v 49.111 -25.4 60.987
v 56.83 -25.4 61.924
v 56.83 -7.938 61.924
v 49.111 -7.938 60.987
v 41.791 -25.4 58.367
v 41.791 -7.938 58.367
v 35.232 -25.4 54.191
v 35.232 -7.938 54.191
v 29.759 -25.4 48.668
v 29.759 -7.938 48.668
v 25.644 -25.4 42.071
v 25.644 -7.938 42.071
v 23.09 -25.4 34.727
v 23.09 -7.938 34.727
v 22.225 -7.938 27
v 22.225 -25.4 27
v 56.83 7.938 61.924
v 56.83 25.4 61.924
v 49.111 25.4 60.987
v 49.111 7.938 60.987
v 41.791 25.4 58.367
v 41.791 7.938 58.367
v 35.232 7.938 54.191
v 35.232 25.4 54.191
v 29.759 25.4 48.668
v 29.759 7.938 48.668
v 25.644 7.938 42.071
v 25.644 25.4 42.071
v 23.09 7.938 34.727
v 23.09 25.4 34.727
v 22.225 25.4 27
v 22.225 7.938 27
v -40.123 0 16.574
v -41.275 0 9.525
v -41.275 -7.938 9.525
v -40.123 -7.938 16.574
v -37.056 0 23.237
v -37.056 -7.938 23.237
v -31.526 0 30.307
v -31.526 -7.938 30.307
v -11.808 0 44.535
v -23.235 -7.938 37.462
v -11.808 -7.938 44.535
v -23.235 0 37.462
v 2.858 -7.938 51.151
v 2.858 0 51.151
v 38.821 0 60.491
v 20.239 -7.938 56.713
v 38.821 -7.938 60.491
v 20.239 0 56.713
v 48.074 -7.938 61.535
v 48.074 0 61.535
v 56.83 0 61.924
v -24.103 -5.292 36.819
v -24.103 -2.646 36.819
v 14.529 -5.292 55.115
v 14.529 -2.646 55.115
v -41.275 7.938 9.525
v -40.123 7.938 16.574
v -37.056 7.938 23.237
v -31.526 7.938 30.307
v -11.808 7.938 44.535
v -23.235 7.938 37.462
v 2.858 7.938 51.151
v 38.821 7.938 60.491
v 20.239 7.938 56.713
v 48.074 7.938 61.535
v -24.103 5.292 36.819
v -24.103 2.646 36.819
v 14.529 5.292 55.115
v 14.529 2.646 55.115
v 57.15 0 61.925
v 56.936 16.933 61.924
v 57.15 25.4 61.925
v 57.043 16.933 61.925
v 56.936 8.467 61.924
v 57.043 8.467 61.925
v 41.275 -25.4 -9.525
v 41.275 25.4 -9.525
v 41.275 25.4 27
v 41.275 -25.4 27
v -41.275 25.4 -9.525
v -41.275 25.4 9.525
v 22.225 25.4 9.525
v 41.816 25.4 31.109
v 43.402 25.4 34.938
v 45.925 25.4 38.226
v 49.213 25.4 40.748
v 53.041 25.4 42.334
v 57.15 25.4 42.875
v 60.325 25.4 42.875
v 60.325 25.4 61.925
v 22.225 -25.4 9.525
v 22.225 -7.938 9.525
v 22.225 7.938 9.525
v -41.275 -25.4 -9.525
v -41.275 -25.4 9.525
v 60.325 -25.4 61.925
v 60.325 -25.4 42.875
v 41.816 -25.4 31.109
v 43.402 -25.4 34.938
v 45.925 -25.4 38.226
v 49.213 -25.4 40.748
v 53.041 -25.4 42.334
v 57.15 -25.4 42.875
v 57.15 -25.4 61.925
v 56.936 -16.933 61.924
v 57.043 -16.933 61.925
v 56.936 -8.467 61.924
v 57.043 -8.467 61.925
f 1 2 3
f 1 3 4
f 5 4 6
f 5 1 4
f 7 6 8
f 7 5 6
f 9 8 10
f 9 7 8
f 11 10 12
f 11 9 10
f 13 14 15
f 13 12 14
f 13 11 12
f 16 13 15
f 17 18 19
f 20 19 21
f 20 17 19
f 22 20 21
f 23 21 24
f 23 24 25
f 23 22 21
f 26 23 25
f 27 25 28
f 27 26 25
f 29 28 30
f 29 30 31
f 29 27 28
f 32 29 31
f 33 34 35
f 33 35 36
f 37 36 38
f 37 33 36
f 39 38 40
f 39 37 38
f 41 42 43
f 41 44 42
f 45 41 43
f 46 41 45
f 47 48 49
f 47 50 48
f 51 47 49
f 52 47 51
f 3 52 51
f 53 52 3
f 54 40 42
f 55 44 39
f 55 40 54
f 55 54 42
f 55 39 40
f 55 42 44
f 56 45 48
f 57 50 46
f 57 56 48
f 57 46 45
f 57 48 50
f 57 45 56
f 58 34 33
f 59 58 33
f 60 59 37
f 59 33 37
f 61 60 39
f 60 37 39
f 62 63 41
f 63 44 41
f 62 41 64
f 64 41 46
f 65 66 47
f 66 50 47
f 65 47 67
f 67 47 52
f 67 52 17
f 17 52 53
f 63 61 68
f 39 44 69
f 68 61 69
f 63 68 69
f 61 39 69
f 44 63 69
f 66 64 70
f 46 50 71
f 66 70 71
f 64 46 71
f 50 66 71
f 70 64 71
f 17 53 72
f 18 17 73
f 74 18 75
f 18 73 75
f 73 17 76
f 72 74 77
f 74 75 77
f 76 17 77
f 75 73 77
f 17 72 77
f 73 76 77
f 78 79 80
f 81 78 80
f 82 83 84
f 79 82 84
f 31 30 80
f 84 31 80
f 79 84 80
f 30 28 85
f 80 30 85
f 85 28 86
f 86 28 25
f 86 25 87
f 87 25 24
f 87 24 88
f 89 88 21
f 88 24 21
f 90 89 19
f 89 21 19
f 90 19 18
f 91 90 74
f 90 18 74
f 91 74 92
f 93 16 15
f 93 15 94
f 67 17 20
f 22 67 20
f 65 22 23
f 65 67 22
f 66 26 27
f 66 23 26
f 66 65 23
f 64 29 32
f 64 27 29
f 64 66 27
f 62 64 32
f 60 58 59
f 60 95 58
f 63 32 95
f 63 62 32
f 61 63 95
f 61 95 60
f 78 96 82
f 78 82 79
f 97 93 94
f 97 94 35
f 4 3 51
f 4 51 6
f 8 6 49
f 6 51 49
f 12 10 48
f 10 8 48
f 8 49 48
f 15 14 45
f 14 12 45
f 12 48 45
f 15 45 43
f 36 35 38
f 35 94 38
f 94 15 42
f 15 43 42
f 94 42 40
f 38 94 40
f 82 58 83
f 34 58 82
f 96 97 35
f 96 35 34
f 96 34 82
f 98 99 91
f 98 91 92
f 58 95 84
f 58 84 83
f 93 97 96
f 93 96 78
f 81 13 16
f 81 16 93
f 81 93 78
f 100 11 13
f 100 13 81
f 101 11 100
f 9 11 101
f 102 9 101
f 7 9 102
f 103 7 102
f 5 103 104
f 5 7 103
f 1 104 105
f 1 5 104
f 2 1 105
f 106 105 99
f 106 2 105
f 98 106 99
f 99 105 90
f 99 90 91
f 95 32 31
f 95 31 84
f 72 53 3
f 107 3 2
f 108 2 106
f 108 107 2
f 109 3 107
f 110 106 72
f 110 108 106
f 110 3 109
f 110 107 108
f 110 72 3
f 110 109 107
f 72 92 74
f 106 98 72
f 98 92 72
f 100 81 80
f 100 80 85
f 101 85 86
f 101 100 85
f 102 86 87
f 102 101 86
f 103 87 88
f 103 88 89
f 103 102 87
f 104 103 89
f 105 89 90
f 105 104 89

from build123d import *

# Parameters (mm, degrees)
F1_DEPTH = 25.4
F2_DEPTH = 7.9375


with BuildPart() as f1:
    # F0 (on Front) → F1 (new body, symmetric)
    with BuildSketch(Plane.XZ):
        Polygon((22.225, 9.525), (-41.275, 9.525), (-41.275, -9.525), (41.275, -9.525), (41.275, 9.525), align=None)
        with BuildLine():
            Line((22.225, 27.0002), (22.225, 9.525))
            Line((22.225, 9.525), (41.275, 9.525))
            Line((41.275, 9.525), (41.275, 27.0002))
            ThreePointArc((41.275, 27.0002), (45.92468, 38.22552), (57.15, 42.8752))
            Line((57.15, 42.8752), (60.325, 42.8752))
            Line((60.325, 42.8752), (60.325, 61.9252))
            Line((60.325, 61.9252), (57.15, 61.9252))
            add(Edge.make_bspline(
                [(56.829578, 61.92373), (56.936552, 61.924385), (57.04336, 61.924875), (57.15, 61.9252)],
                knots=[111.193178, 111.193178, 111.193178, 111.193178, 111.504536, 111.504536, 111.504536, 111.504536], degree=3))
            ThreePointArc((56.829578, 61.92373), (32.341268, 51.582357), (22.225, 27.0002))
        make_face()
    extrude(amount=F1_DEPTH, both=True)

    # F0 (on Front) → F2 (join, symmetric)
    with BuildSketch(Plane.XZ):
        with BuildLine():
            add(Edge.make_bspline(
                [(-41.275, 9.525), (-40.764818, 40.487092), (18.626642, 61.690006), (56.829578, 61.92373)],
                knots=[0, 0, 0, 0, 111.193178, 111.193178, 111.193178, 111.193178], degree=3))
            Line((-41.275, 9.525), (22.225, 9.525))
            Line((22.225, 9.525), (22.225, 27.0002))
            ThreePointArc((22.225, 27.0002), (32.341268, 51.582357), (56.829578, 61.92373))
        make_face()
    extrude(amount=F2_DEPTH, both=True)


solid = f1.part
